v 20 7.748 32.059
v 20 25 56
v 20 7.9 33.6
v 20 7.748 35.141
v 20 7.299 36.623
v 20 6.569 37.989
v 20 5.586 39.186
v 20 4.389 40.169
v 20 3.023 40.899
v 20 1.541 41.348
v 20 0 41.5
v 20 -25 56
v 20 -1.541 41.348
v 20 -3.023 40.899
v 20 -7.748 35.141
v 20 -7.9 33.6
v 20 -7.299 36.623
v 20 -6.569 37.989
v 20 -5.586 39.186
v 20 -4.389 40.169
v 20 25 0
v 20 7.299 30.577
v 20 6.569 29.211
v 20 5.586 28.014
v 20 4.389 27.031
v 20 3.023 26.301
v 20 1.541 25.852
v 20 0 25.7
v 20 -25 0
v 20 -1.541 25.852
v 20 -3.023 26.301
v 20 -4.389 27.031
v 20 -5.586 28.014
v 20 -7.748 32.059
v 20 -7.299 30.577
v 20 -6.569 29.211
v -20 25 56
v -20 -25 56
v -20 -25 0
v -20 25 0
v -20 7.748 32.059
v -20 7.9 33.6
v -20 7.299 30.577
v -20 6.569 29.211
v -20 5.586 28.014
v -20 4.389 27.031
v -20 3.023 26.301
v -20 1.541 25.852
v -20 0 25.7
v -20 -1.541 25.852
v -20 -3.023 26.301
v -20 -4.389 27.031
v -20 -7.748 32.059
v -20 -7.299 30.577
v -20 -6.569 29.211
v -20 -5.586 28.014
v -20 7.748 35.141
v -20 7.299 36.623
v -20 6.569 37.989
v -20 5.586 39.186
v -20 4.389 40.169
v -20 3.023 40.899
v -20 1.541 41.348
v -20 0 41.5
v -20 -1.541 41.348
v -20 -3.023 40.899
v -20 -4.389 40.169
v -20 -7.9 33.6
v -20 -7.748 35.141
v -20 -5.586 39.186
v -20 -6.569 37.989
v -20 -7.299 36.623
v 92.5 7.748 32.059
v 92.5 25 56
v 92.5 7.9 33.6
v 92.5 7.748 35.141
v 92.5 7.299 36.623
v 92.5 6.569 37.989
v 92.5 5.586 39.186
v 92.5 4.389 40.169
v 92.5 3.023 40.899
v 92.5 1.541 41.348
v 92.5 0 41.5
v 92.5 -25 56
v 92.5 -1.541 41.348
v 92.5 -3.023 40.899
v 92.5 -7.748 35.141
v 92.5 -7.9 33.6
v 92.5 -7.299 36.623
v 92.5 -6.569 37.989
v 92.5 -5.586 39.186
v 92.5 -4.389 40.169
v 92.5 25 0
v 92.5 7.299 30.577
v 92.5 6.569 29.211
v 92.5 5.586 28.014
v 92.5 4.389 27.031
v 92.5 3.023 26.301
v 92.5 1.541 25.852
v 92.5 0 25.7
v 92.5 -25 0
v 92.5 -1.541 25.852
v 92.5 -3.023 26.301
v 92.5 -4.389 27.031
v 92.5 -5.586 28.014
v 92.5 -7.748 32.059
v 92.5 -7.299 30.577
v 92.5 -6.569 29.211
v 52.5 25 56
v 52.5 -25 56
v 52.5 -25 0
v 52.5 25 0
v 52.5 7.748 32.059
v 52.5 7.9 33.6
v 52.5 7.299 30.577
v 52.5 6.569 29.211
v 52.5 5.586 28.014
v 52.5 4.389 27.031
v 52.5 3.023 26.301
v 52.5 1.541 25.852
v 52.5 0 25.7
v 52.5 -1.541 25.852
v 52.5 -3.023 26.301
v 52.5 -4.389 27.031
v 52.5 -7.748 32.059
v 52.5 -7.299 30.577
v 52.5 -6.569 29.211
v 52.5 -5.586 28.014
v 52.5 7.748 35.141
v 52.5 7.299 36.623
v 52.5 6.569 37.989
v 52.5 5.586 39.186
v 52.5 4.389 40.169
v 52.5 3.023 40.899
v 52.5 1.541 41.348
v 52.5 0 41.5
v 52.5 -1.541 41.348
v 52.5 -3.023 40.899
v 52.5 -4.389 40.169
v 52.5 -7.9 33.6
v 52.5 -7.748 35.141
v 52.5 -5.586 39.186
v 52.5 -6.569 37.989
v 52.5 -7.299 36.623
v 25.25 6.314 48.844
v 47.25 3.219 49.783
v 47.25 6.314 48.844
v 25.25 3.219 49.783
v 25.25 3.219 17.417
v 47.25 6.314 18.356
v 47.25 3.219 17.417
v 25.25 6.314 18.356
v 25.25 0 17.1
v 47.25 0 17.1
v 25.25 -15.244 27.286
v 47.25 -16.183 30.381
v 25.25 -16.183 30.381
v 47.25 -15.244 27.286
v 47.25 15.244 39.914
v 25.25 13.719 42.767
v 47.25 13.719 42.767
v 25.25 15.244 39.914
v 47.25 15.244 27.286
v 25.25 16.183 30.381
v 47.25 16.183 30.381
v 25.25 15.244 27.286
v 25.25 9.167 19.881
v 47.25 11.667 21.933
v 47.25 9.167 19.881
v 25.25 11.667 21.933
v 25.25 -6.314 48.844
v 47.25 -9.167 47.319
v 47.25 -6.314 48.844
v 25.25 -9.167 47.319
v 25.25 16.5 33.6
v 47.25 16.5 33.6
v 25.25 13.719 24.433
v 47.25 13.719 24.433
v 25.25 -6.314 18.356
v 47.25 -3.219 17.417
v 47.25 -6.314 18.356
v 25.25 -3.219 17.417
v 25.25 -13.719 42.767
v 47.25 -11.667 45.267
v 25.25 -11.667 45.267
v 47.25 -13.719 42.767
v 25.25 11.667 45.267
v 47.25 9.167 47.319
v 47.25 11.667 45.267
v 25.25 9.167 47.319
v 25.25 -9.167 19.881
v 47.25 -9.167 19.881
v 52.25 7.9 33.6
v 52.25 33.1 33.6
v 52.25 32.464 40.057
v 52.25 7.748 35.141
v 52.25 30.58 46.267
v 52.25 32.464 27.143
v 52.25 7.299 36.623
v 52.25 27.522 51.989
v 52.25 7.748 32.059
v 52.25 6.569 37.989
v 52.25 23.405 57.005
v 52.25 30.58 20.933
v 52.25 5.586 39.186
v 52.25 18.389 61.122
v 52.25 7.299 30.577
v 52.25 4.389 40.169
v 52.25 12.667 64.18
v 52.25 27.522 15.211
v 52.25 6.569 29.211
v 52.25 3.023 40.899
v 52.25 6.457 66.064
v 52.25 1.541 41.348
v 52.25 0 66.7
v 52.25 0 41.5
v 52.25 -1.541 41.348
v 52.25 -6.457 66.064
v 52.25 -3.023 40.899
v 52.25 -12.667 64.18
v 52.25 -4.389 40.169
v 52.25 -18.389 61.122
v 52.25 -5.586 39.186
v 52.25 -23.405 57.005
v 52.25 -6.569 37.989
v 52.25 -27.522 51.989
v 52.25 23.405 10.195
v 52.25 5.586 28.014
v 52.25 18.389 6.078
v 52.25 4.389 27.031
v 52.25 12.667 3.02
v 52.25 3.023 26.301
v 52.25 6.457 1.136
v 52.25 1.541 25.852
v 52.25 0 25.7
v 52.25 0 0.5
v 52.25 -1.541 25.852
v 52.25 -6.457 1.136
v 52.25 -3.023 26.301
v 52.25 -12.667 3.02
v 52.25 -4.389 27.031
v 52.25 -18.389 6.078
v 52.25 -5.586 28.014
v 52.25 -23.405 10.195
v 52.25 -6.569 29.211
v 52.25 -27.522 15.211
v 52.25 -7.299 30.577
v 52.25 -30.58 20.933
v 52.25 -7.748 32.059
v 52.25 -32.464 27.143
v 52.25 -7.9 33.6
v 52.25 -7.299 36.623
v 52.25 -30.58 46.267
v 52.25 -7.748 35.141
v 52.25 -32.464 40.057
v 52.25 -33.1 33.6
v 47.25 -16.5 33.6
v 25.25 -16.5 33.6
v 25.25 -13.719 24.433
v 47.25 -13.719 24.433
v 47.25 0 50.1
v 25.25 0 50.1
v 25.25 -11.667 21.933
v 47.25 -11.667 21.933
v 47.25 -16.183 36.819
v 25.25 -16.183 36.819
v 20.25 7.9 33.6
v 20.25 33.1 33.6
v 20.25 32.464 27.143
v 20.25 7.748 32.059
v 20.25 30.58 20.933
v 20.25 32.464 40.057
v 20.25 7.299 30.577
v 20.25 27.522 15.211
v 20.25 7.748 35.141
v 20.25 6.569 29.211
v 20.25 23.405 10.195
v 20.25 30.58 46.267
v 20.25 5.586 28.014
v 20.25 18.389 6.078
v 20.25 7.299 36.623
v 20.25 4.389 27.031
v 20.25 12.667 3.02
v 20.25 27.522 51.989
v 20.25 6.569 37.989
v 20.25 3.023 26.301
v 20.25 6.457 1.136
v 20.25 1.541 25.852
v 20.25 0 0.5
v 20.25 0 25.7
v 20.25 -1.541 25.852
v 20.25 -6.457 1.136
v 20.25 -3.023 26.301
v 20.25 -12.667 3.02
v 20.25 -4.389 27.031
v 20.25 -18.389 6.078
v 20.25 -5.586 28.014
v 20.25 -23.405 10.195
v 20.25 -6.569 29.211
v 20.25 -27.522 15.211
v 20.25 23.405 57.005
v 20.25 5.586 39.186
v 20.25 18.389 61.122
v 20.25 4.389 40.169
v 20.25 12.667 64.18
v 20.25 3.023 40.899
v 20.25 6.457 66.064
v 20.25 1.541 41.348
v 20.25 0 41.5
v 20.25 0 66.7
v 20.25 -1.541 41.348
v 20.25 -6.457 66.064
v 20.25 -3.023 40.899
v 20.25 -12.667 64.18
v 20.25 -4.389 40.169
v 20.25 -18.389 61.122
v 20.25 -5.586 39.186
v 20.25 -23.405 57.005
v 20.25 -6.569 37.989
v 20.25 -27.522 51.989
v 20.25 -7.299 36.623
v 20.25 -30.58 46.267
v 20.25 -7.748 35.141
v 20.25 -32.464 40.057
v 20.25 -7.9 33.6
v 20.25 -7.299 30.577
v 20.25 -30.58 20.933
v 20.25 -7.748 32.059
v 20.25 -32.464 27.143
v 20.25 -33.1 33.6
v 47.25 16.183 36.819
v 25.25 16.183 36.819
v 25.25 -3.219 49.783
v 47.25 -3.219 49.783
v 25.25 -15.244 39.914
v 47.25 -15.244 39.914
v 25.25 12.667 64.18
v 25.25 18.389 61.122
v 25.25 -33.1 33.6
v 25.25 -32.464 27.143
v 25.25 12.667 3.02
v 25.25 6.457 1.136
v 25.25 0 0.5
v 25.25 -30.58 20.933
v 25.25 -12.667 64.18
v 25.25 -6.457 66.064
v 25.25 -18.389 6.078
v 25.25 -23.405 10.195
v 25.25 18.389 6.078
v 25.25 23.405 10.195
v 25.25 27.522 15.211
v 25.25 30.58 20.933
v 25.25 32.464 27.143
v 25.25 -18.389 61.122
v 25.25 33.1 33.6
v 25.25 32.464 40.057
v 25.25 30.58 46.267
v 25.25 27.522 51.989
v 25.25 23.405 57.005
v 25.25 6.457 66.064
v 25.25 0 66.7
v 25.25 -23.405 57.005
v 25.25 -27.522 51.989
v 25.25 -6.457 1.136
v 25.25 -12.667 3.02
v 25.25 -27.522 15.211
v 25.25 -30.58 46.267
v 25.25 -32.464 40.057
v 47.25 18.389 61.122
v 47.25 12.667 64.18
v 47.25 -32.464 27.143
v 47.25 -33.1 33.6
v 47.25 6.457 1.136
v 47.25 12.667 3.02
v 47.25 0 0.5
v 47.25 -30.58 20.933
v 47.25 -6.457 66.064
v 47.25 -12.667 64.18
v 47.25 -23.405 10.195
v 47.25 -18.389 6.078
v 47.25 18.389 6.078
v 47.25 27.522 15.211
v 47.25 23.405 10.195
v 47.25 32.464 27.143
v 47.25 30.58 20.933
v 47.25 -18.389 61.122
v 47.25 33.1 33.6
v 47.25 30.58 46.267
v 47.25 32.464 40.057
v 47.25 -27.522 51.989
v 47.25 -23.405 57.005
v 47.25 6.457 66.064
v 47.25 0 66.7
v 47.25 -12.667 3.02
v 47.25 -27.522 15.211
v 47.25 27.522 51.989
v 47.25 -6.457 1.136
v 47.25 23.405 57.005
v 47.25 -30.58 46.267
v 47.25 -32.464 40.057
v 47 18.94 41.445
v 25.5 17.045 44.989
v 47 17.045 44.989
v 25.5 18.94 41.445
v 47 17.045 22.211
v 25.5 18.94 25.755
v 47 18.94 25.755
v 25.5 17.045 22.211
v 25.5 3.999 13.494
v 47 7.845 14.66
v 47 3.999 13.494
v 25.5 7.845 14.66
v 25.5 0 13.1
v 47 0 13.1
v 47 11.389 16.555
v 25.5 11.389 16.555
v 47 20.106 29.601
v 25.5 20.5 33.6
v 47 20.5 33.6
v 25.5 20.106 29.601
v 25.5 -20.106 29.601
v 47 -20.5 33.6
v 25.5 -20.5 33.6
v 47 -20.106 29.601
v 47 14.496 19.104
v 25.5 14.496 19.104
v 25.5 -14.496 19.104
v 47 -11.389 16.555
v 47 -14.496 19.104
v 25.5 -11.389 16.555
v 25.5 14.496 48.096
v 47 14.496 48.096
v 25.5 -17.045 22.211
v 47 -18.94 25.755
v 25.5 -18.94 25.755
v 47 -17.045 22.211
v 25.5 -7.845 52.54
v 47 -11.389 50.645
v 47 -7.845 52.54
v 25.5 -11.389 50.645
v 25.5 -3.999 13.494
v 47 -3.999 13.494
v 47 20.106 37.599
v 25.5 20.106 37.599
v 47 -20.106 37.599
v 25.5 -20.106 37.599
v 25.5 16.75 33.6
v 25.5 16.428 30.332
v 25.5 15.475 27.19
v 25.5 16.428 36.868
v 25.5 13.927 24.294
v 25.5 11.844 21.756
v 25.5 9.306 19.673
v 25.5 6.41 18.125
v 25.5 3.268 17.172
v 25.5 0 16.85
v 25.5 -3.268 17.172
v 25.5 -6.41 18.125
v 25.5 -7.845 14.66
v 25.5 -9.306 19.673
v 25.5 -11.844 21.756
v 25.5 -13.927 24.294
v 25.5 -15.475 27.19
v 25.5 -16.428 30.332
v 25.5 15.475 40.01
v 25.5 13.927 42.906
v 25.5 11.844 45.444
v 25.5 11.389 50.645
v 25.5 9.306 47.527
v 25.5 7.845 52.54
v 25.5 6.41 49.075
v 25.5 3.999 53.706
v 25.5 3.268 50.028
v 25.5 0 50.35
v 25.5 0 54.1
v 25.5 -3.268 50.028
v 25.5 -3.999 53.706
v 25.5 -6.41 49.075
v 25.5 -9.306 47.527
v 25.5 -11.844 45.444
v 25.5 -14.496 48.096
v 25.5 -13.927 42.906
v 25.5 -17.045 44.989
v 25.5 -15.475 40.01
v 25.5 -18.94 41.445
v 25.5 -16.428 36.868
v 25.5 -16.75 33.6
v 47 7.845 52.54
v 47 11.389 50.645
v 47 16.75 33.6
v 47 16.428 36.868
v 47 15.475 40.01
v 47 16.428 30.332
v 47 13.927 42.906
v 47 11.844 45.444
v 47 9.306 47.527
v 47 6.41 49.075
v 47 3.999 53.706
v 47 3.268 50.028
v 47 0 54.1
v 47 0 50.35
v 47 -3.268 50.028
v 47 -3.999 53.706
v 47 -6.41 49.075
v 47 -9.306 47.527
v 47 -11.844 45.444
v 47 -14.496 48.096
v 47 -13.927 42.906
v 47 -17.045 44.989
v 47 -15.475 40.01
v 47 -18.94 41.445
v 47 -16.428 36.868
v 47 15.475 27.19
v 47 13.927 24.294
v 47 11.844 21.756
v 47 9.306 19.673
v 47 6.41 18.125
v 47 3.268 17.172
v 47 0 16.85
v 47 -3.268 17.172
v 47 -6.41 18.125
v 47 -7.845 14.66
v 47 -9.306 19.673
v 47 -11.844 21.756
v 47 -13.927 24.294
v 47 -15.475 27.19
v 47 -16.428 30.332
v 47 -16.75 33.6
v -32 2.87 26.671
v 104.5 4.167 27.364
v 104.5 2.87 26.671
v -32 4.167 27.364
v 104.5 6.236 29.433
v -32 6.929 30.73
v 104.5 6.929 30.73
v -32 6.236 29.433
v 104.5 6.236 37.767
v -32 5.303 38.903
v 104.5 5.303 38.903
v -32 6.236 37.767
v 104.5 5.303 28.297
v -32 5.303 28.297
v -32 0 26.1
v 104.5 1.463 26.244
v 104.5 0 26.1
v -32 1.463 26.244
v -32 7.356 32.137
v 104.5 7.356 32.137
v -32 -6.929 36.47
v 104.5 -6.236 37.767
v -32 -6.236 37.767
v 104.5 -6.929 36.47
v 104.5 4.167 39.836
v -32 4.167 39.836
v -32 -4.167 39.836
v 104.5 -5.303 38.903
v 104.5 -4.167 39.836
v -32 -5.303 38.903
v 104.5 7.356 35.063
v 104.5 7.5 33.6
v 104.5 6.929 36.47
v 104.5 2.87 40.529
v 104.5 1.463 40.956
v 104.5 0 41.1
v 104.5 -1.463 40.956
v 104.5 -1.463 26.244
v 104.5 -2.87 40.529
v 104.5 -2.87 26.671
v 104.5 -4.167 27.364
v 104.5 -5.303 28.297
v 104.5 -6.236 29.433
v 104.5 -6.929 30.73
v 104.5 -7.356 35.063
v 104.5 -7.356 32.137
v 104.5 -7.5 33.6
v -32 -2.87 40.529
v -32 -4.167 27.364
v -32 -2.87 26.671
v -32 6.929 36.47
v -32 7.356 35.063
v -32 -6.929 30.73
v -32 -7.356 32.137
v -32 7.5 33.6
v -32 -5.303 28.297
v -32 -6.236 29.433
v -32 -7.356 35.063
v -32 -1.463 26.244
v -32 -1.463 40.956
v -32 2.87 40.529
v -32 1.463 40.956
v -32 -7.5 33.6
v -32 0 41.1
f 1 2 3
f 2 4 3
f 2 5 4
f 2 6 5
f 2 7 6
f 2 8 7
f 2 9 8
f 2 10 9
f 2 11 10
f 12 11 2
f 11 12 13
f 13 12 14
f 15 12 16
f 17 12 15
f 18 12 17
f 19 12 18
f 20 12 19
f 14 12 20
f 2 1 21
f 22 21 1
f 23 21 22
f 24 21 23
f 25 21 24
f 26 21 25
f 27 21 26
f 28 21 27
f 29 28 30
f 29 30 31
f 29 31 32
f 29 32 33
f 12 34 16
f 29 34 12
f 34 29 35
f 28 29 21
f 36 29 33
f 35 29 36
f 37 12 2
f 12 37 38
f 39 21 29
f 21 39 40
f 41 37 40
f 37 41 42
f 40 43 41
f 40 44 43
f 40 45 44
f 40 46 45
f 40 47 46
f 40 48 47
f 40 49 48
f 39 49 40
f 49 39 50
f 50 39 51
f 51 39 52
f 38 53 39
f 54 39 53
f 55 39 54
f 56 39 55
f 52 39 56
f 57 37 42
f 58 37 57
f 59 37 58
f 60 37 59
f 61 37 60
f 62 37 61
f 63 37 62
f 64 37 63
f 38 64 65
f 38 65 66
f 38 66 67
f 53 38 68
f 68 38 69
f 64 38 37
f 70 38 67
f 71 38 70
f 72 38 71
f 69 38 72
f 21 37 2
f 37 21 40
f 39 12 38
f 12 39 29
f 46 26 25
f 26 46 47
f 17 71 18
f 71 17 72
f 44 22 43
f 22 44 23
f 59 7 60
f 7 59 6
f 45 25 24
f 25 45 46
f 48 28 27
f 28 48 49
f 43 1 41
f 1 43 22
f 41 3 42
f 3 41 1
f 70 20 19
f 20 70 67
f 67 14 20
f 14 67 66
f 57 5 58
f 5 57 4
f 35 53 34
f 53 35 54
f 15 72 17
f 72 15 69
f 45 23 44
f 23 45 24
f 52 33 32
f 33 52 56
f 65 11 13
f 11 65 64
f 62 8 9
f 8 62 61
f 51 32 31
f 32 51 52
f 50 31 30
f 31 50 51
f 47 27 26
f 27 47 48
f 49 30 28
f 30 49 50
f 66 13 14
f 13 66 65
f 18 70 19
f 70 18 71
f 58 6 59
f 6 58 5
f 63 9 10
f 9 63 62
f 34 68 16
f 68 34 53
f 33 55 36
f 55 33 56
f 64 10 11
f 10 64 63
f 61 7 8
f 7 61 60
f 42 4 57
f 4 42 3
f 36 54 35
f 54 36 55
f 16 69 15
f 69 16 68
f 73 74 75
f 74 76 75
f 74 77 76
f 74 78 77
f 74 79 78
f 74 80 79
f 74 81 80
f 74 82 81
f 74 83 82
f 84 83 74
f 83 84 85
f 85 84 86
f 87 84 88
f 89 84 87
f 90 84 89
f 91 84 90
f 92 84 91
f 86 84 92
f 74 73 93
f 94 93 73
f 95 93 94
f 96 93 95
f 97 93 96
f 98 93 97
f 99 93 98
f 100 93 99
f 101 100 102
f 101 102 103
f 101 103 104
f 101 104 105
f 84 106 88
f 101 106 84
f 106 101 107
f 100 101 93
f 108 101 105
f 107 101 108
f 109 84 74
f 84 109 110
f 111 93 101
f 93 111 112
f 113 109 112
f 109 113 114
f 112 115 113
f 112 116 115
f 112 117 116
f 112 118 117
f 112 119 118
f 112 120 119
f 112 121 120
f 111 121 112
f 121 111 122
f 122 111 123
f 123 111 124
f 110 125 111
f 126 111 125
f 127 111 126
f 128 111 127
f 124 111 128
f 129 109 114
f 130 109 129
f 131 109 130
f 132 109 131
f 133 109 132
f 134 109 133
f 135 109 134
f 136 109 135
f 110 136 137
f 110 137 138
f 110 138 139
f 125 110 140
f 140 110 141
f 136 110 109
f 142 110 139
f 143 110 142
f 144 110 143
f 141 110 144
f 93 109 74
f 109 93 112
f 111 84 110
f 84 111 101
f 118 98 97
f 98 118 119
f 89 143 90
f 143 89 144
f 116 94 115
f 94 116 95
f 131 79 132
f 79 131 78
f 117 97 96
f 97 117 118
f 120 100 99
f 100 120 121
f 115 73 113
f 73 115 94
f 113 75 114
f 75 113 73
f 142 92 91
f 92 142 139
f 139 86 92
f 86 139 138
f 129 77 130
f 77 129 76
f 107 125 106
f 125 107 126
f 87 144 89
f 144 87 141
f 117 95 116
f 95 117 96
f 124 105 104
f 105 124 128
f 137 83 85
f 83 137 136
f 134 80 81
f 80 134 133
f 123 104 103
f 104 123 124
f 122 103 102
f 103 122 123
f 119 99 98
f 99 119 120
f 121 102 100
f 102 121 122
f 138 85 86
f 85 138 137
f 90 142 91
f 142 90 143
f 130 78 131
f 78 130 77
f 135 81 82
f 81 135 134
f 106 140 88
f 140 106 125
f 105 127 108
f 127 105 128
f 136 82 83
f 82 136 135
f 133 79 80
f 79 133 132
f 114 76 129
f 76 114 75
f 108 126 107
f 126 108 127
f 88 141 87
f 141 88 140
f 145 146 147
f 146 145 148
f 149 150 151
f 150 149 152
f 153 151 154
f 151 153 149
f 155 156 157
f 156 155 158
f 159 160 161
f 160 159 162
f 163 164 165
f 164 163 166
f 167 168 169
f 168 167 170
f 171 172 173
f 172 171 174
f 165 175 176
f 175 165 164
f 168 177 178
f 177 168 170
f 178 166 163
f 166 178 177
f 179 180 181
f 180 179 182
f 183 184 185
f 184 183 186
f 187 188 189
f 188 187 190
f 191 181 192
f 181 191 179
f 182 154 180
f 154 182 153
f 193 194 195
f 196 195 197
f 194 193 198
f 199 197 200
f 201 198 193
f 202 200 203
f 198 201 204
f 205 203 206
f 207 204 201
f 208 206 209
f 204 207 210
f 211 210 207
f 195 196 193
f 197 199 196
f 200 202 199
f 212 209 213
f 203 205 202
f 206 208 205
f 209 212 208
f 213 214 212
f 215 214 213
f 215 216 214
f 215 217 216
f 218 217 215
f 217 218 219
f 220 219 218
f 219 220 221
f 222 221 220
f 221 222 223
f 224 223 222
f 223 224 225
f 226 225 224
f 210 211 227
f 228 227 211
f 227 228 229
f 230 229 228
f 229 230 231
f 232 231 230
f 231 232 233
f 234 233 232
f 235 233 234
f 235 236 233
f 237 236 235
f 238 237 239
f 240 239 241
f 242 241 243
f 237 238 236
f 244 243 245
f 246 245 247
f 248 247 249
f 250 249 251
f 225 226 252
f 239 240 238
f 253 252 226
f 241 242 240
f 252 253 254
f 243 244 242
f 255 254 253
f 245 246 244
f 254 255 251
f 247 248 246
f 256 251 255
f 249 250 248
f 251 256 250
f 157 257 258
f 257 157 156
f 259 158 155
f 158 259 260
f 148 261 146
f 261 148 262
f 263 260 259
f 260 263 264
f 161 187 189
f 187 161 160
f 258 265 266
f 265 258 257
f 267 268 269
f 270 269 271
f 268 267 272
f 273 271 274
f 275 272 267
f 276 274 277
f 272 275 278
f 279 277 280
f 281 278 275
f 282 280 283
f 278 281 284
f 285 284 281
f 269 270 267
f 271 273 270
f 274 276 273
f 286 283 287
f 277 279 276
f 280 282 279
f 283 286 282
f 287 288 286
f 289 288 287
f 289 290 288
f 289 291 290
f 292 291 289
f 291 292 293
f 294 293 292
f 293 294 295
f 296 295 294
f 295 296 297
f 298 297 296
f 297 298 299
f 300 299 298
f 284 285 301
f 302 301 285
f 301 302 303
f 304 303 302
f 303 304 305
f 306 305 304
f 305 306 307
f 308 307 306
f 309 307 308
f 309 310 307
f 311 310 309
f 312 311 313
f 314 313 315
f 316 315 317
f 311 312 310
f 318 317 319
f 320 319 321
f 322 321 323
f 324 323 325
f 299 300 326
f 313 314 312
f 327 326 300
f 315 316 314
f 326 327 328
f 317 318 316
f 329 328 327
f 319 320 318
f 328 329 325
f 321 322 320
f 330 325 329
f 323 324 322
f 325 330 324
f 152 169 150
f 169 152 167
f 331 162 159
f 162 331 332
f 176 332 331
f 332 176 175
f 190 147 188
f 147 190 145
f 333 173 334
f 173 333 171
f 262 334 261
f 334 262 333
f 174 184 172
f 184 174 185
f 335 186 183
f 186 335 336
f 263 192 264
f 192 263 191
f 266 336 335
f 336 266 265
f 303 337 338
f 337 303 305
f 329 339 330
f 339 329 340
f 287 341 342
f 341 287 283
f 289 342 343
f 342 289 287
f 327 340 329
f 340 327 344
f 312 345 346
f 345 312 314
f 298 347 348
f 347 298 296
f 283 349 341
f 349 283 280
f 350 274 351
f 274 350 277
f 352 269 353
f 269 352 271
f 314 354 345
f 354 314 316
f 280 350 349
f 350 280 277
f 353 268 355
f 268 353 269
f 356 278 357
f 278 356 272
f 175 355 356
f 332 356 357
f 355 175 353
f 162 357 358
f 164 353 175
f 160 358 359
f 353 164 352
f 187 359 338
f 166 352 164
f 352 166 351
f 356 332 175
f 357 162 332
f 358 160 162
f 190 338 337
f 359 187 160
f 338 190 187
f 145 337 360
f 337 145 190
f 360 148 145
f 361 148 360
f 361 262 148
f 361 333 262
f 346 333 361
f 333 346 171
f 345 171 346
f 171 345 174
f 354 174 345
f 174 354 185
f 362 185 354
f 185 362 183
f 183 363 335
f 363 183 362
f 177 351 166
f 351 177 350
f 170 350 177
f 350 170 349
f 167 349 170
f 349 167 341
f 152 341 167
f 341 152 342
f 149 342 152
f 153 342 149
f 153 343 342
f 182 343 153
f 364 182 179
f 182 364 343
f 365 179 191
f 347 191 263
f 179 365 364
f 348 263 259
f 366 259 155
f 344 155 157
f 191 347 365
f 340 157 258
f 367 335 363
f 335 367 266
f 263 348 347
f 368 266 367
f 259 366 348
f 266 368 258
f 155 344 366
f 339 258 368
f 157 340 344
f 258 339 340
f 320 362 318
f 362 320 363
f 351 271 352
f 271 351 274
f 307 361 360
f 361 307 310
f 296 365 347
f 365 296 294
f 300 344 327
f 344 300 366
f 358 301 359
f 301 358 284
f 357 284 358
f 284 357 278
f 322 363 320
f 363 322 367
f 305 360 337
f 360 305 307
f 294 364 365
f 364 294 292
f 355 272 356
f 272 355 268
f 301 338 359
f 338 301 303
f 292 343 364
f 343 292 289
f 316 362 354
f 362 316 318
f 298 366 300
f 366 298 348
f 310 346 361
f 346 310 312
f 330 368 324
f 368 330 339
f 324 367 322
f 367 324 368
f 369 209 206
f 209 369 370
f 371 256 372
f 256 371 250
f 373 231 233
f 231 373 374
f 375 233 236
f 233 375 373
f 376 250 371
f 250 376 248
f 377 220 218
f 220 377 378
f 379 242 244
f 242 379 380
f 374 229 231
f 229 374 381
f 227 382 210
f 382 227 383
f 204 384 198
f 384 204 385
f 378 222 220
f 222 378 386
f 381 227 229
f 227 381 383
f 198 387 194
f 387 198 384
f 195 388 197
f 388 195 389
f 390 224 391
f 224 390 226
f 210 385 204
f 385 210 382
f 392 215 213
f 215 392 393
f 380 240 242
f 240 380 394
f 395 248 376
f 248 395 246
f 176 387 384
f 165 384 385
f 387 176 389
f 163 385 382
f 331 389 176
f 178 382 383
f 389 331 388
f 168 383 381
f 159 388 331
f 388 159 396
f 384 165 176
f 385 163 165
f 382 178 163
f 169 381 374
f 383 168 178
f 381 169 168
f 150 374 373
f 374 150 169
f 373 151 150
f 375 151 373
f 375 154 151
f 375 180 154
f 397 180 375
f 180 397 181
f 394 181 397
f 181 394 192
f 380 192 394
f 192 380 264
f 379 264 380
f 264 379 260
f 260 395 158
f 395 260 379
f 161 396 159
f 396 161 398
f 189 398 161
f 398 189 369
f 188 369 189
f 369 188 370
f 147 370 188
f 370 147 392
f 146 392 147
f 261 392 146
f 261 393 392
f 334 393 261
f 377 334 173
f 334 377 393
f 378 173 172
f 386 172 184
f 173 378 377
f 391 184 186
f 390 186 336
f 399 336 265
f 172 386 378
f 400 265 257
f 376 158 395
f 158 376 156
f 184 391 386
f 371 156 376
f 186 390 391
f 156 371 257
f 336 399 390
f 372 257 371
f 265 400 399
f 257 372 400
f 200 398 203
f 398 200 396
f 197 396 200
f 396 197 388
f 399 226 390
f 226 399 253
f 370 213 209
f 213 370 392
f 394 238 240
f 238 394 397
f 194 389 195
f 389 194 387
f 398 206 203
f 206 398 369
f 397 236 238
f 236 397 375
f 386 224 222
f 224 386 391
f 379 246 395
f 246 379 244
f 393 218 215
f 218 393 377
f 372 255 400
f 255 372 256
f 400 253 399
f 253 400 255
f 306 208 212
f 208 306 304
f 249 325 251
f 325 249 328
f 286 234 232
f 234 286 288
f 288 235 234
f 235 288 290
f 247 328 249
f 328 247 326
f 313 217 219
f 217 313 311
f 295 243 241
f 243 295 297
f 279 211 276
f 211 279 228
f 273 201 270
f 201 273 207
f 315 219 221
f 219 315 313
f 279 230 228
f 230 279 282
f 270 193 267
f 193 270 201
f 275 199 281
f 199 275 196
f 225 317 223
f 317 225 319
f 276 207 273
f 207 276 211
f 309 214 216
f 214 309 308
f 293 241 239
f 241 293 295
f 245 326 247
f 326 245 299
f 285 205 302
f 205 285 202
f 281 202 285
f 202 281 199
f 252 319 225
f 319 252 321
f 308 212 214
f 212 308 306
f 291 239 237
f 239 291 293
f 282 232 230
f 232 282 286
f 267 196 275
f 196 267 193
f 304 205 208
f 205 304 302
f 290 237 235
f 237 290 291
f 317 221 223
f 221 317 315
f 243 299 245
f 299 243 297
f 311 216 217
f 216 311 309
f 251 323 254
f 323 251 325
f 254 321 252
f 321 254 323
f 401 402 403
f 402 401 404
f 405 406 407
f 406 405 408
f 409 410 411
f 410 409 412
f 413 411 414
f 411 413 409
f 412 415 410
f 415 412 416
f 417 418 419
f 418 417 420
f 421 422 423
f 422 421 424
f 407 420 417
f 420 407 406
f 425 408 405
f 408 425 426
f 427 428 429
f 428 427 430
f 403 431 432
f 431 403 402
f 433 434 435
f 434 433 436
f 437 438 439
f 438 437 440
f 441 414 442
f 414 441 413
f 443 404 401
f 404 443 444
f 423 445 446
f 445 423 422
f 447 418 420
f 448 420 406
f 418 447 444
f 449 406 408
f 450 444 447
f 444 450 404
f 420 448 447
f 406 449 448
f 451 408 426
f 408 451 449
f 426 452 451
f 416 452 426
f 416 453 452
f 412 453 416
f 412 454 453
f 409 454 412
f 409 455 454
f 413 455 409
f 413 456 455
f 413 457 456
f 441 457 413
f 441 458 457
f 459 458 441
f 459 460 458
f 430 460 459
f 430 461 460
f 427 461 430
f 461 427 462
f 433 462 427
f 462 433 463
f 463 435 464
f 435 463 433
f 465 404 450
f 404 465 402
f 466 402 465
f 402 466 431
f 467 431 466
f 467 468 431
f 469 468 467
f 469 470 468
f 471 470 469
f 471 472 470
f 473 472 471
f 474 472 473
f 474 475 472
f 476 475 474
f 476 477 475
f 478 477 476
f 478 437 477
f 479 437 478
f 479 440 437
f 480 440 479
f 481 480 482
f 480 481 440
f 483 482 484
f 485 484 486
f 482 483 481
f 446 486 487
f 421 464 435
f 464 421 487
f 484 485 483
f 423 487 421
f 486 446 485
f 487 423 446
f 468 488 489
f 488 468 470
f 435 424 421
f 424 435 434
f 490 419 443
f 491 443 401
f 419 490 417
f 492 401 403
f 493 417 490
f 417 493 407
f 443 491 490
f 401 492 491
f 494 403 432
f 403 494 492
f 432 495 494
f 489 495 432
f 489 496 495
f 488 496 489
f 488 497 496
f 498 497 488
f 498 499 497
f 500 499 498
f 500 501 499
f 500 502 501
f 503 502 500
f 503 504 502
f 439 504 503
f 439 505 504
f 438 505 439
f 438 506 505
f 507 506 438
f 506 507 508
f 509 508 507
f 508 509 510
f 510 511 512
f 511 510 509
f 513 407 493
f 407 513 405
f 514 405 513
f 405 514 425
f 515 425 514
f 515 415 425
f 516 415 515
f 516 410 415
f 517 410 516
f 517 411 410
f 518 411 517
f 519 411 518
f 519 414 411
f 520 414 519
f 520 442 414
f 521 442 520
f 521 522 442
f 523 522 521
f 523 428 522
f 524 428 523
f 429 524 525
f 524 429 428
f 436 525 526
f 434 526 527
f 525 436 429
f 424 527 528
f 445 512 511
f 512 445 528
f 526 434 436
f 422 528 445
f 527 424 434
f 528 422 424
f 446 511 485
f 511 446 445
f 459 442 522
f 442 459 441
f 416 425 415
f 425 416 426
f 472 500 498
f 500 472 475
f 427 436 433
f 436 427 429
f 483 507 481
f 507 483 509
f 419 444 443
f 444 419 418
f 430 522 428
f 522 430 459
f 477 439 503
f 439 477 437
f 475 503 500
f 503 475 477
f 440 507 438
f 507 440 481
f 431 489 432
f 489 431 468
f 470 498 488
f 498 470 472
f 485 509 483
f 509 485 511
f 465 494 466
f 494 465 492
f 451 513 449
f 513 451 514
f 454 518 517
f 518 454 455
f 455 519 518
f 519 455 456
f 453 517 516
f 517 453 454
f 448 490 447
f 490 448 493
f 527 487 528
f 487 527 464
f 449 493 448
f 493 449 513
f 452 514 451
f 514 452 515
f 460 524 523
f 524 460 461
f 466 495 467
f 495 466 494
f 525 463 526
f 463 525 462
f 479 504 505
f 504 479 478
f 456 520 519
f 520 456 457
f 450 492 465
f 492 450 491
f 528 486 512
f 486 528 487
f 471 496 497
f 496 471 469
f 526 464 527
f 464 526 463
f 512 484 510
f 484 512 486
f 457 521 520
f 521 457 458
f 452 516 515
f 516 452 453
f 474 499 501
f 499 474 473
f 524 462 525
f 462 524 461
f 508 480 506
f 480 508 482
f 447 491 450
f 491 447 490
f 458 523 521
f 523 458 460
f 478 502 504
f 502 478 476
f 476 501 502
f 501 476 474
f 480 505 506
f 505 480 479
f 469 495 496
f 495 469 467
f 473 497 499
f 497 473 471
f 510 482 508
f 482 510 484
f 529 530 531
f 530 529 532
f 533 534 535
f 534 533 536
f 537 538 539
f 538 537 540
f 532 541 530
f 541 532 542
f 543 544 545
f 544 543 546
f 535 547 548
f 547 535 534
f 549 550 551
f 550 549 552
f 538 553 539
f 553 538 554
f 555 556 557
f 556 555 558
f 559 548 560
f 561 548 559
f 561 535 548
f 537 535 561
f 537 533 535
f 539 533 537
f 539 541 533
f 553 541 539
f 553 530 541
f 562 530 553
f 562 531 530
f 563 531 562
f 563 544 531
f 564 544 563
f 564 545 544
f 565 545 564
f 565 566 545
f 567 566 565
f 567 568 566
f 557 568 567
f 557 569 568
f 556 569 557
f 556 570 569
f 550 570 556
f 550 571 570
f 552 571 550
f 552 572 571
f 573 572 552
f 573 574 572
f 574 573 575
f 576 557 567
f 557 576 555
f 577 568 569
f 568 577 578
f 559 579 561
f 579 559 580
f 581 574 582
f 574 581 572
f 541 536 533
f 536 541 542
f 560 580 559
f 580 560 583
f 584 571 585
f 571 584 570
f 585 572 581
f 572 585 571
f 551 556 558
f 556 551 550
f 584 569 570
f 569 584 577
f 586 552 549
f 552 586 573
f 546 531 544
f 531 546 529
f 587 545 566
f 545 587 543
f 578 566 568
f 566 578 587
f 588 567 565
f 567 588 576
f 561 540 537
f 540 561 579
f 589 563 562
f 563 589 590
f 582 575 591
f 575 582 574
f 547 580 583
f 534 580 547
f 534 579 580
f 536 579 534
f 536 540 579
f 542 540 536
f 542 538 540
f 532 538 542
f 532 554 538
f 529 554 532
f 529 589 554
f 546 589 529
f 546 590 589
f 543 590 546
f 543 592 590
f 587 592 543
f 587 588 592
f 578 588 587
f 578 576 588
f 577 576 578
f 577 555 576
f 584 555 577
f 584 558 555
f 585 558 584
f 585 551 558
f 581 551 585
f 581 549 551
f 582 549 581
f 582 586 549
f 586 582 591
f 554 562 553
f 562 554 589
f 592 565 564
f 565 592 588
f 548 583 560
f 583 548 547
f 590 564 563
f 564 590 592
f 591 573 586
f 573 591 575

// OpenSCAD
$fn = 32;

// ------------------------------------------------------------------------
// Pulley assembly: d66.2 pulley with a belt, shaft d15
// Every part is its own module, assembly() places them once.
// ------------------------------------------------------------------------

// --- part 1 ---
module support1() {
  difference() {
    translate([-20, -25, 0]) cube([40, 50, 56]);
    translate([0, 0, 33.6]) rotate([0, 90, 0]) cylinder(h = 42, d = 15.8, center = true);
  }
}

// --- part 2 ---
module support2() {
  difference() {
    translate([-20, -25, 0]) cube([40, 50, 56]);
    translate([0, 0, 33.6]) rotate([0, 90, 0]) cylinder(h = 42, d = 15.8, center = true);
  }
}

// --- part 3 ---
module shaft() {
  translate([0, 0, -68.25]) cylinder(h = 136.5, d = 15);
}

// --- part 4 ---
module pulley() {
  difference() {
    union() {
      cylinder(h = 32, d = 33);
      cylinder(h = 5, d = 66.2);
      translate([0, 0, 27]) cylinder(h = 5, d = 66.2);
    }
    translate([0, 0, -1]) cylinder(h = 34, d = 15.8);
  }
}

// --- part 5 ---
module belt() {
  difference() {
      translate([0, 0, 0]) cylinder(h = 21.5, d = 41);
      translate([0, 0, -1]) cylinder(h = 23.5, d = 33.5);
    }
}

// --- assembly ---
module assembly() {
  translate([0, 0, 0]) rotate([0, 0, 0]) support1();
  translate([72.5, 0, 0]) rotate([0, 0, 0]) support2();
  translate([36.25, 0, 33.6]) rotate([0, 90, 0]) shaft();
  translate([20.25, 0, 33.6]) rotate([0, 90, 0]) pulley();
  translate([25.5, 0, 33.6]) rotate([0, 90, 0]) belt();
}

assembly();
